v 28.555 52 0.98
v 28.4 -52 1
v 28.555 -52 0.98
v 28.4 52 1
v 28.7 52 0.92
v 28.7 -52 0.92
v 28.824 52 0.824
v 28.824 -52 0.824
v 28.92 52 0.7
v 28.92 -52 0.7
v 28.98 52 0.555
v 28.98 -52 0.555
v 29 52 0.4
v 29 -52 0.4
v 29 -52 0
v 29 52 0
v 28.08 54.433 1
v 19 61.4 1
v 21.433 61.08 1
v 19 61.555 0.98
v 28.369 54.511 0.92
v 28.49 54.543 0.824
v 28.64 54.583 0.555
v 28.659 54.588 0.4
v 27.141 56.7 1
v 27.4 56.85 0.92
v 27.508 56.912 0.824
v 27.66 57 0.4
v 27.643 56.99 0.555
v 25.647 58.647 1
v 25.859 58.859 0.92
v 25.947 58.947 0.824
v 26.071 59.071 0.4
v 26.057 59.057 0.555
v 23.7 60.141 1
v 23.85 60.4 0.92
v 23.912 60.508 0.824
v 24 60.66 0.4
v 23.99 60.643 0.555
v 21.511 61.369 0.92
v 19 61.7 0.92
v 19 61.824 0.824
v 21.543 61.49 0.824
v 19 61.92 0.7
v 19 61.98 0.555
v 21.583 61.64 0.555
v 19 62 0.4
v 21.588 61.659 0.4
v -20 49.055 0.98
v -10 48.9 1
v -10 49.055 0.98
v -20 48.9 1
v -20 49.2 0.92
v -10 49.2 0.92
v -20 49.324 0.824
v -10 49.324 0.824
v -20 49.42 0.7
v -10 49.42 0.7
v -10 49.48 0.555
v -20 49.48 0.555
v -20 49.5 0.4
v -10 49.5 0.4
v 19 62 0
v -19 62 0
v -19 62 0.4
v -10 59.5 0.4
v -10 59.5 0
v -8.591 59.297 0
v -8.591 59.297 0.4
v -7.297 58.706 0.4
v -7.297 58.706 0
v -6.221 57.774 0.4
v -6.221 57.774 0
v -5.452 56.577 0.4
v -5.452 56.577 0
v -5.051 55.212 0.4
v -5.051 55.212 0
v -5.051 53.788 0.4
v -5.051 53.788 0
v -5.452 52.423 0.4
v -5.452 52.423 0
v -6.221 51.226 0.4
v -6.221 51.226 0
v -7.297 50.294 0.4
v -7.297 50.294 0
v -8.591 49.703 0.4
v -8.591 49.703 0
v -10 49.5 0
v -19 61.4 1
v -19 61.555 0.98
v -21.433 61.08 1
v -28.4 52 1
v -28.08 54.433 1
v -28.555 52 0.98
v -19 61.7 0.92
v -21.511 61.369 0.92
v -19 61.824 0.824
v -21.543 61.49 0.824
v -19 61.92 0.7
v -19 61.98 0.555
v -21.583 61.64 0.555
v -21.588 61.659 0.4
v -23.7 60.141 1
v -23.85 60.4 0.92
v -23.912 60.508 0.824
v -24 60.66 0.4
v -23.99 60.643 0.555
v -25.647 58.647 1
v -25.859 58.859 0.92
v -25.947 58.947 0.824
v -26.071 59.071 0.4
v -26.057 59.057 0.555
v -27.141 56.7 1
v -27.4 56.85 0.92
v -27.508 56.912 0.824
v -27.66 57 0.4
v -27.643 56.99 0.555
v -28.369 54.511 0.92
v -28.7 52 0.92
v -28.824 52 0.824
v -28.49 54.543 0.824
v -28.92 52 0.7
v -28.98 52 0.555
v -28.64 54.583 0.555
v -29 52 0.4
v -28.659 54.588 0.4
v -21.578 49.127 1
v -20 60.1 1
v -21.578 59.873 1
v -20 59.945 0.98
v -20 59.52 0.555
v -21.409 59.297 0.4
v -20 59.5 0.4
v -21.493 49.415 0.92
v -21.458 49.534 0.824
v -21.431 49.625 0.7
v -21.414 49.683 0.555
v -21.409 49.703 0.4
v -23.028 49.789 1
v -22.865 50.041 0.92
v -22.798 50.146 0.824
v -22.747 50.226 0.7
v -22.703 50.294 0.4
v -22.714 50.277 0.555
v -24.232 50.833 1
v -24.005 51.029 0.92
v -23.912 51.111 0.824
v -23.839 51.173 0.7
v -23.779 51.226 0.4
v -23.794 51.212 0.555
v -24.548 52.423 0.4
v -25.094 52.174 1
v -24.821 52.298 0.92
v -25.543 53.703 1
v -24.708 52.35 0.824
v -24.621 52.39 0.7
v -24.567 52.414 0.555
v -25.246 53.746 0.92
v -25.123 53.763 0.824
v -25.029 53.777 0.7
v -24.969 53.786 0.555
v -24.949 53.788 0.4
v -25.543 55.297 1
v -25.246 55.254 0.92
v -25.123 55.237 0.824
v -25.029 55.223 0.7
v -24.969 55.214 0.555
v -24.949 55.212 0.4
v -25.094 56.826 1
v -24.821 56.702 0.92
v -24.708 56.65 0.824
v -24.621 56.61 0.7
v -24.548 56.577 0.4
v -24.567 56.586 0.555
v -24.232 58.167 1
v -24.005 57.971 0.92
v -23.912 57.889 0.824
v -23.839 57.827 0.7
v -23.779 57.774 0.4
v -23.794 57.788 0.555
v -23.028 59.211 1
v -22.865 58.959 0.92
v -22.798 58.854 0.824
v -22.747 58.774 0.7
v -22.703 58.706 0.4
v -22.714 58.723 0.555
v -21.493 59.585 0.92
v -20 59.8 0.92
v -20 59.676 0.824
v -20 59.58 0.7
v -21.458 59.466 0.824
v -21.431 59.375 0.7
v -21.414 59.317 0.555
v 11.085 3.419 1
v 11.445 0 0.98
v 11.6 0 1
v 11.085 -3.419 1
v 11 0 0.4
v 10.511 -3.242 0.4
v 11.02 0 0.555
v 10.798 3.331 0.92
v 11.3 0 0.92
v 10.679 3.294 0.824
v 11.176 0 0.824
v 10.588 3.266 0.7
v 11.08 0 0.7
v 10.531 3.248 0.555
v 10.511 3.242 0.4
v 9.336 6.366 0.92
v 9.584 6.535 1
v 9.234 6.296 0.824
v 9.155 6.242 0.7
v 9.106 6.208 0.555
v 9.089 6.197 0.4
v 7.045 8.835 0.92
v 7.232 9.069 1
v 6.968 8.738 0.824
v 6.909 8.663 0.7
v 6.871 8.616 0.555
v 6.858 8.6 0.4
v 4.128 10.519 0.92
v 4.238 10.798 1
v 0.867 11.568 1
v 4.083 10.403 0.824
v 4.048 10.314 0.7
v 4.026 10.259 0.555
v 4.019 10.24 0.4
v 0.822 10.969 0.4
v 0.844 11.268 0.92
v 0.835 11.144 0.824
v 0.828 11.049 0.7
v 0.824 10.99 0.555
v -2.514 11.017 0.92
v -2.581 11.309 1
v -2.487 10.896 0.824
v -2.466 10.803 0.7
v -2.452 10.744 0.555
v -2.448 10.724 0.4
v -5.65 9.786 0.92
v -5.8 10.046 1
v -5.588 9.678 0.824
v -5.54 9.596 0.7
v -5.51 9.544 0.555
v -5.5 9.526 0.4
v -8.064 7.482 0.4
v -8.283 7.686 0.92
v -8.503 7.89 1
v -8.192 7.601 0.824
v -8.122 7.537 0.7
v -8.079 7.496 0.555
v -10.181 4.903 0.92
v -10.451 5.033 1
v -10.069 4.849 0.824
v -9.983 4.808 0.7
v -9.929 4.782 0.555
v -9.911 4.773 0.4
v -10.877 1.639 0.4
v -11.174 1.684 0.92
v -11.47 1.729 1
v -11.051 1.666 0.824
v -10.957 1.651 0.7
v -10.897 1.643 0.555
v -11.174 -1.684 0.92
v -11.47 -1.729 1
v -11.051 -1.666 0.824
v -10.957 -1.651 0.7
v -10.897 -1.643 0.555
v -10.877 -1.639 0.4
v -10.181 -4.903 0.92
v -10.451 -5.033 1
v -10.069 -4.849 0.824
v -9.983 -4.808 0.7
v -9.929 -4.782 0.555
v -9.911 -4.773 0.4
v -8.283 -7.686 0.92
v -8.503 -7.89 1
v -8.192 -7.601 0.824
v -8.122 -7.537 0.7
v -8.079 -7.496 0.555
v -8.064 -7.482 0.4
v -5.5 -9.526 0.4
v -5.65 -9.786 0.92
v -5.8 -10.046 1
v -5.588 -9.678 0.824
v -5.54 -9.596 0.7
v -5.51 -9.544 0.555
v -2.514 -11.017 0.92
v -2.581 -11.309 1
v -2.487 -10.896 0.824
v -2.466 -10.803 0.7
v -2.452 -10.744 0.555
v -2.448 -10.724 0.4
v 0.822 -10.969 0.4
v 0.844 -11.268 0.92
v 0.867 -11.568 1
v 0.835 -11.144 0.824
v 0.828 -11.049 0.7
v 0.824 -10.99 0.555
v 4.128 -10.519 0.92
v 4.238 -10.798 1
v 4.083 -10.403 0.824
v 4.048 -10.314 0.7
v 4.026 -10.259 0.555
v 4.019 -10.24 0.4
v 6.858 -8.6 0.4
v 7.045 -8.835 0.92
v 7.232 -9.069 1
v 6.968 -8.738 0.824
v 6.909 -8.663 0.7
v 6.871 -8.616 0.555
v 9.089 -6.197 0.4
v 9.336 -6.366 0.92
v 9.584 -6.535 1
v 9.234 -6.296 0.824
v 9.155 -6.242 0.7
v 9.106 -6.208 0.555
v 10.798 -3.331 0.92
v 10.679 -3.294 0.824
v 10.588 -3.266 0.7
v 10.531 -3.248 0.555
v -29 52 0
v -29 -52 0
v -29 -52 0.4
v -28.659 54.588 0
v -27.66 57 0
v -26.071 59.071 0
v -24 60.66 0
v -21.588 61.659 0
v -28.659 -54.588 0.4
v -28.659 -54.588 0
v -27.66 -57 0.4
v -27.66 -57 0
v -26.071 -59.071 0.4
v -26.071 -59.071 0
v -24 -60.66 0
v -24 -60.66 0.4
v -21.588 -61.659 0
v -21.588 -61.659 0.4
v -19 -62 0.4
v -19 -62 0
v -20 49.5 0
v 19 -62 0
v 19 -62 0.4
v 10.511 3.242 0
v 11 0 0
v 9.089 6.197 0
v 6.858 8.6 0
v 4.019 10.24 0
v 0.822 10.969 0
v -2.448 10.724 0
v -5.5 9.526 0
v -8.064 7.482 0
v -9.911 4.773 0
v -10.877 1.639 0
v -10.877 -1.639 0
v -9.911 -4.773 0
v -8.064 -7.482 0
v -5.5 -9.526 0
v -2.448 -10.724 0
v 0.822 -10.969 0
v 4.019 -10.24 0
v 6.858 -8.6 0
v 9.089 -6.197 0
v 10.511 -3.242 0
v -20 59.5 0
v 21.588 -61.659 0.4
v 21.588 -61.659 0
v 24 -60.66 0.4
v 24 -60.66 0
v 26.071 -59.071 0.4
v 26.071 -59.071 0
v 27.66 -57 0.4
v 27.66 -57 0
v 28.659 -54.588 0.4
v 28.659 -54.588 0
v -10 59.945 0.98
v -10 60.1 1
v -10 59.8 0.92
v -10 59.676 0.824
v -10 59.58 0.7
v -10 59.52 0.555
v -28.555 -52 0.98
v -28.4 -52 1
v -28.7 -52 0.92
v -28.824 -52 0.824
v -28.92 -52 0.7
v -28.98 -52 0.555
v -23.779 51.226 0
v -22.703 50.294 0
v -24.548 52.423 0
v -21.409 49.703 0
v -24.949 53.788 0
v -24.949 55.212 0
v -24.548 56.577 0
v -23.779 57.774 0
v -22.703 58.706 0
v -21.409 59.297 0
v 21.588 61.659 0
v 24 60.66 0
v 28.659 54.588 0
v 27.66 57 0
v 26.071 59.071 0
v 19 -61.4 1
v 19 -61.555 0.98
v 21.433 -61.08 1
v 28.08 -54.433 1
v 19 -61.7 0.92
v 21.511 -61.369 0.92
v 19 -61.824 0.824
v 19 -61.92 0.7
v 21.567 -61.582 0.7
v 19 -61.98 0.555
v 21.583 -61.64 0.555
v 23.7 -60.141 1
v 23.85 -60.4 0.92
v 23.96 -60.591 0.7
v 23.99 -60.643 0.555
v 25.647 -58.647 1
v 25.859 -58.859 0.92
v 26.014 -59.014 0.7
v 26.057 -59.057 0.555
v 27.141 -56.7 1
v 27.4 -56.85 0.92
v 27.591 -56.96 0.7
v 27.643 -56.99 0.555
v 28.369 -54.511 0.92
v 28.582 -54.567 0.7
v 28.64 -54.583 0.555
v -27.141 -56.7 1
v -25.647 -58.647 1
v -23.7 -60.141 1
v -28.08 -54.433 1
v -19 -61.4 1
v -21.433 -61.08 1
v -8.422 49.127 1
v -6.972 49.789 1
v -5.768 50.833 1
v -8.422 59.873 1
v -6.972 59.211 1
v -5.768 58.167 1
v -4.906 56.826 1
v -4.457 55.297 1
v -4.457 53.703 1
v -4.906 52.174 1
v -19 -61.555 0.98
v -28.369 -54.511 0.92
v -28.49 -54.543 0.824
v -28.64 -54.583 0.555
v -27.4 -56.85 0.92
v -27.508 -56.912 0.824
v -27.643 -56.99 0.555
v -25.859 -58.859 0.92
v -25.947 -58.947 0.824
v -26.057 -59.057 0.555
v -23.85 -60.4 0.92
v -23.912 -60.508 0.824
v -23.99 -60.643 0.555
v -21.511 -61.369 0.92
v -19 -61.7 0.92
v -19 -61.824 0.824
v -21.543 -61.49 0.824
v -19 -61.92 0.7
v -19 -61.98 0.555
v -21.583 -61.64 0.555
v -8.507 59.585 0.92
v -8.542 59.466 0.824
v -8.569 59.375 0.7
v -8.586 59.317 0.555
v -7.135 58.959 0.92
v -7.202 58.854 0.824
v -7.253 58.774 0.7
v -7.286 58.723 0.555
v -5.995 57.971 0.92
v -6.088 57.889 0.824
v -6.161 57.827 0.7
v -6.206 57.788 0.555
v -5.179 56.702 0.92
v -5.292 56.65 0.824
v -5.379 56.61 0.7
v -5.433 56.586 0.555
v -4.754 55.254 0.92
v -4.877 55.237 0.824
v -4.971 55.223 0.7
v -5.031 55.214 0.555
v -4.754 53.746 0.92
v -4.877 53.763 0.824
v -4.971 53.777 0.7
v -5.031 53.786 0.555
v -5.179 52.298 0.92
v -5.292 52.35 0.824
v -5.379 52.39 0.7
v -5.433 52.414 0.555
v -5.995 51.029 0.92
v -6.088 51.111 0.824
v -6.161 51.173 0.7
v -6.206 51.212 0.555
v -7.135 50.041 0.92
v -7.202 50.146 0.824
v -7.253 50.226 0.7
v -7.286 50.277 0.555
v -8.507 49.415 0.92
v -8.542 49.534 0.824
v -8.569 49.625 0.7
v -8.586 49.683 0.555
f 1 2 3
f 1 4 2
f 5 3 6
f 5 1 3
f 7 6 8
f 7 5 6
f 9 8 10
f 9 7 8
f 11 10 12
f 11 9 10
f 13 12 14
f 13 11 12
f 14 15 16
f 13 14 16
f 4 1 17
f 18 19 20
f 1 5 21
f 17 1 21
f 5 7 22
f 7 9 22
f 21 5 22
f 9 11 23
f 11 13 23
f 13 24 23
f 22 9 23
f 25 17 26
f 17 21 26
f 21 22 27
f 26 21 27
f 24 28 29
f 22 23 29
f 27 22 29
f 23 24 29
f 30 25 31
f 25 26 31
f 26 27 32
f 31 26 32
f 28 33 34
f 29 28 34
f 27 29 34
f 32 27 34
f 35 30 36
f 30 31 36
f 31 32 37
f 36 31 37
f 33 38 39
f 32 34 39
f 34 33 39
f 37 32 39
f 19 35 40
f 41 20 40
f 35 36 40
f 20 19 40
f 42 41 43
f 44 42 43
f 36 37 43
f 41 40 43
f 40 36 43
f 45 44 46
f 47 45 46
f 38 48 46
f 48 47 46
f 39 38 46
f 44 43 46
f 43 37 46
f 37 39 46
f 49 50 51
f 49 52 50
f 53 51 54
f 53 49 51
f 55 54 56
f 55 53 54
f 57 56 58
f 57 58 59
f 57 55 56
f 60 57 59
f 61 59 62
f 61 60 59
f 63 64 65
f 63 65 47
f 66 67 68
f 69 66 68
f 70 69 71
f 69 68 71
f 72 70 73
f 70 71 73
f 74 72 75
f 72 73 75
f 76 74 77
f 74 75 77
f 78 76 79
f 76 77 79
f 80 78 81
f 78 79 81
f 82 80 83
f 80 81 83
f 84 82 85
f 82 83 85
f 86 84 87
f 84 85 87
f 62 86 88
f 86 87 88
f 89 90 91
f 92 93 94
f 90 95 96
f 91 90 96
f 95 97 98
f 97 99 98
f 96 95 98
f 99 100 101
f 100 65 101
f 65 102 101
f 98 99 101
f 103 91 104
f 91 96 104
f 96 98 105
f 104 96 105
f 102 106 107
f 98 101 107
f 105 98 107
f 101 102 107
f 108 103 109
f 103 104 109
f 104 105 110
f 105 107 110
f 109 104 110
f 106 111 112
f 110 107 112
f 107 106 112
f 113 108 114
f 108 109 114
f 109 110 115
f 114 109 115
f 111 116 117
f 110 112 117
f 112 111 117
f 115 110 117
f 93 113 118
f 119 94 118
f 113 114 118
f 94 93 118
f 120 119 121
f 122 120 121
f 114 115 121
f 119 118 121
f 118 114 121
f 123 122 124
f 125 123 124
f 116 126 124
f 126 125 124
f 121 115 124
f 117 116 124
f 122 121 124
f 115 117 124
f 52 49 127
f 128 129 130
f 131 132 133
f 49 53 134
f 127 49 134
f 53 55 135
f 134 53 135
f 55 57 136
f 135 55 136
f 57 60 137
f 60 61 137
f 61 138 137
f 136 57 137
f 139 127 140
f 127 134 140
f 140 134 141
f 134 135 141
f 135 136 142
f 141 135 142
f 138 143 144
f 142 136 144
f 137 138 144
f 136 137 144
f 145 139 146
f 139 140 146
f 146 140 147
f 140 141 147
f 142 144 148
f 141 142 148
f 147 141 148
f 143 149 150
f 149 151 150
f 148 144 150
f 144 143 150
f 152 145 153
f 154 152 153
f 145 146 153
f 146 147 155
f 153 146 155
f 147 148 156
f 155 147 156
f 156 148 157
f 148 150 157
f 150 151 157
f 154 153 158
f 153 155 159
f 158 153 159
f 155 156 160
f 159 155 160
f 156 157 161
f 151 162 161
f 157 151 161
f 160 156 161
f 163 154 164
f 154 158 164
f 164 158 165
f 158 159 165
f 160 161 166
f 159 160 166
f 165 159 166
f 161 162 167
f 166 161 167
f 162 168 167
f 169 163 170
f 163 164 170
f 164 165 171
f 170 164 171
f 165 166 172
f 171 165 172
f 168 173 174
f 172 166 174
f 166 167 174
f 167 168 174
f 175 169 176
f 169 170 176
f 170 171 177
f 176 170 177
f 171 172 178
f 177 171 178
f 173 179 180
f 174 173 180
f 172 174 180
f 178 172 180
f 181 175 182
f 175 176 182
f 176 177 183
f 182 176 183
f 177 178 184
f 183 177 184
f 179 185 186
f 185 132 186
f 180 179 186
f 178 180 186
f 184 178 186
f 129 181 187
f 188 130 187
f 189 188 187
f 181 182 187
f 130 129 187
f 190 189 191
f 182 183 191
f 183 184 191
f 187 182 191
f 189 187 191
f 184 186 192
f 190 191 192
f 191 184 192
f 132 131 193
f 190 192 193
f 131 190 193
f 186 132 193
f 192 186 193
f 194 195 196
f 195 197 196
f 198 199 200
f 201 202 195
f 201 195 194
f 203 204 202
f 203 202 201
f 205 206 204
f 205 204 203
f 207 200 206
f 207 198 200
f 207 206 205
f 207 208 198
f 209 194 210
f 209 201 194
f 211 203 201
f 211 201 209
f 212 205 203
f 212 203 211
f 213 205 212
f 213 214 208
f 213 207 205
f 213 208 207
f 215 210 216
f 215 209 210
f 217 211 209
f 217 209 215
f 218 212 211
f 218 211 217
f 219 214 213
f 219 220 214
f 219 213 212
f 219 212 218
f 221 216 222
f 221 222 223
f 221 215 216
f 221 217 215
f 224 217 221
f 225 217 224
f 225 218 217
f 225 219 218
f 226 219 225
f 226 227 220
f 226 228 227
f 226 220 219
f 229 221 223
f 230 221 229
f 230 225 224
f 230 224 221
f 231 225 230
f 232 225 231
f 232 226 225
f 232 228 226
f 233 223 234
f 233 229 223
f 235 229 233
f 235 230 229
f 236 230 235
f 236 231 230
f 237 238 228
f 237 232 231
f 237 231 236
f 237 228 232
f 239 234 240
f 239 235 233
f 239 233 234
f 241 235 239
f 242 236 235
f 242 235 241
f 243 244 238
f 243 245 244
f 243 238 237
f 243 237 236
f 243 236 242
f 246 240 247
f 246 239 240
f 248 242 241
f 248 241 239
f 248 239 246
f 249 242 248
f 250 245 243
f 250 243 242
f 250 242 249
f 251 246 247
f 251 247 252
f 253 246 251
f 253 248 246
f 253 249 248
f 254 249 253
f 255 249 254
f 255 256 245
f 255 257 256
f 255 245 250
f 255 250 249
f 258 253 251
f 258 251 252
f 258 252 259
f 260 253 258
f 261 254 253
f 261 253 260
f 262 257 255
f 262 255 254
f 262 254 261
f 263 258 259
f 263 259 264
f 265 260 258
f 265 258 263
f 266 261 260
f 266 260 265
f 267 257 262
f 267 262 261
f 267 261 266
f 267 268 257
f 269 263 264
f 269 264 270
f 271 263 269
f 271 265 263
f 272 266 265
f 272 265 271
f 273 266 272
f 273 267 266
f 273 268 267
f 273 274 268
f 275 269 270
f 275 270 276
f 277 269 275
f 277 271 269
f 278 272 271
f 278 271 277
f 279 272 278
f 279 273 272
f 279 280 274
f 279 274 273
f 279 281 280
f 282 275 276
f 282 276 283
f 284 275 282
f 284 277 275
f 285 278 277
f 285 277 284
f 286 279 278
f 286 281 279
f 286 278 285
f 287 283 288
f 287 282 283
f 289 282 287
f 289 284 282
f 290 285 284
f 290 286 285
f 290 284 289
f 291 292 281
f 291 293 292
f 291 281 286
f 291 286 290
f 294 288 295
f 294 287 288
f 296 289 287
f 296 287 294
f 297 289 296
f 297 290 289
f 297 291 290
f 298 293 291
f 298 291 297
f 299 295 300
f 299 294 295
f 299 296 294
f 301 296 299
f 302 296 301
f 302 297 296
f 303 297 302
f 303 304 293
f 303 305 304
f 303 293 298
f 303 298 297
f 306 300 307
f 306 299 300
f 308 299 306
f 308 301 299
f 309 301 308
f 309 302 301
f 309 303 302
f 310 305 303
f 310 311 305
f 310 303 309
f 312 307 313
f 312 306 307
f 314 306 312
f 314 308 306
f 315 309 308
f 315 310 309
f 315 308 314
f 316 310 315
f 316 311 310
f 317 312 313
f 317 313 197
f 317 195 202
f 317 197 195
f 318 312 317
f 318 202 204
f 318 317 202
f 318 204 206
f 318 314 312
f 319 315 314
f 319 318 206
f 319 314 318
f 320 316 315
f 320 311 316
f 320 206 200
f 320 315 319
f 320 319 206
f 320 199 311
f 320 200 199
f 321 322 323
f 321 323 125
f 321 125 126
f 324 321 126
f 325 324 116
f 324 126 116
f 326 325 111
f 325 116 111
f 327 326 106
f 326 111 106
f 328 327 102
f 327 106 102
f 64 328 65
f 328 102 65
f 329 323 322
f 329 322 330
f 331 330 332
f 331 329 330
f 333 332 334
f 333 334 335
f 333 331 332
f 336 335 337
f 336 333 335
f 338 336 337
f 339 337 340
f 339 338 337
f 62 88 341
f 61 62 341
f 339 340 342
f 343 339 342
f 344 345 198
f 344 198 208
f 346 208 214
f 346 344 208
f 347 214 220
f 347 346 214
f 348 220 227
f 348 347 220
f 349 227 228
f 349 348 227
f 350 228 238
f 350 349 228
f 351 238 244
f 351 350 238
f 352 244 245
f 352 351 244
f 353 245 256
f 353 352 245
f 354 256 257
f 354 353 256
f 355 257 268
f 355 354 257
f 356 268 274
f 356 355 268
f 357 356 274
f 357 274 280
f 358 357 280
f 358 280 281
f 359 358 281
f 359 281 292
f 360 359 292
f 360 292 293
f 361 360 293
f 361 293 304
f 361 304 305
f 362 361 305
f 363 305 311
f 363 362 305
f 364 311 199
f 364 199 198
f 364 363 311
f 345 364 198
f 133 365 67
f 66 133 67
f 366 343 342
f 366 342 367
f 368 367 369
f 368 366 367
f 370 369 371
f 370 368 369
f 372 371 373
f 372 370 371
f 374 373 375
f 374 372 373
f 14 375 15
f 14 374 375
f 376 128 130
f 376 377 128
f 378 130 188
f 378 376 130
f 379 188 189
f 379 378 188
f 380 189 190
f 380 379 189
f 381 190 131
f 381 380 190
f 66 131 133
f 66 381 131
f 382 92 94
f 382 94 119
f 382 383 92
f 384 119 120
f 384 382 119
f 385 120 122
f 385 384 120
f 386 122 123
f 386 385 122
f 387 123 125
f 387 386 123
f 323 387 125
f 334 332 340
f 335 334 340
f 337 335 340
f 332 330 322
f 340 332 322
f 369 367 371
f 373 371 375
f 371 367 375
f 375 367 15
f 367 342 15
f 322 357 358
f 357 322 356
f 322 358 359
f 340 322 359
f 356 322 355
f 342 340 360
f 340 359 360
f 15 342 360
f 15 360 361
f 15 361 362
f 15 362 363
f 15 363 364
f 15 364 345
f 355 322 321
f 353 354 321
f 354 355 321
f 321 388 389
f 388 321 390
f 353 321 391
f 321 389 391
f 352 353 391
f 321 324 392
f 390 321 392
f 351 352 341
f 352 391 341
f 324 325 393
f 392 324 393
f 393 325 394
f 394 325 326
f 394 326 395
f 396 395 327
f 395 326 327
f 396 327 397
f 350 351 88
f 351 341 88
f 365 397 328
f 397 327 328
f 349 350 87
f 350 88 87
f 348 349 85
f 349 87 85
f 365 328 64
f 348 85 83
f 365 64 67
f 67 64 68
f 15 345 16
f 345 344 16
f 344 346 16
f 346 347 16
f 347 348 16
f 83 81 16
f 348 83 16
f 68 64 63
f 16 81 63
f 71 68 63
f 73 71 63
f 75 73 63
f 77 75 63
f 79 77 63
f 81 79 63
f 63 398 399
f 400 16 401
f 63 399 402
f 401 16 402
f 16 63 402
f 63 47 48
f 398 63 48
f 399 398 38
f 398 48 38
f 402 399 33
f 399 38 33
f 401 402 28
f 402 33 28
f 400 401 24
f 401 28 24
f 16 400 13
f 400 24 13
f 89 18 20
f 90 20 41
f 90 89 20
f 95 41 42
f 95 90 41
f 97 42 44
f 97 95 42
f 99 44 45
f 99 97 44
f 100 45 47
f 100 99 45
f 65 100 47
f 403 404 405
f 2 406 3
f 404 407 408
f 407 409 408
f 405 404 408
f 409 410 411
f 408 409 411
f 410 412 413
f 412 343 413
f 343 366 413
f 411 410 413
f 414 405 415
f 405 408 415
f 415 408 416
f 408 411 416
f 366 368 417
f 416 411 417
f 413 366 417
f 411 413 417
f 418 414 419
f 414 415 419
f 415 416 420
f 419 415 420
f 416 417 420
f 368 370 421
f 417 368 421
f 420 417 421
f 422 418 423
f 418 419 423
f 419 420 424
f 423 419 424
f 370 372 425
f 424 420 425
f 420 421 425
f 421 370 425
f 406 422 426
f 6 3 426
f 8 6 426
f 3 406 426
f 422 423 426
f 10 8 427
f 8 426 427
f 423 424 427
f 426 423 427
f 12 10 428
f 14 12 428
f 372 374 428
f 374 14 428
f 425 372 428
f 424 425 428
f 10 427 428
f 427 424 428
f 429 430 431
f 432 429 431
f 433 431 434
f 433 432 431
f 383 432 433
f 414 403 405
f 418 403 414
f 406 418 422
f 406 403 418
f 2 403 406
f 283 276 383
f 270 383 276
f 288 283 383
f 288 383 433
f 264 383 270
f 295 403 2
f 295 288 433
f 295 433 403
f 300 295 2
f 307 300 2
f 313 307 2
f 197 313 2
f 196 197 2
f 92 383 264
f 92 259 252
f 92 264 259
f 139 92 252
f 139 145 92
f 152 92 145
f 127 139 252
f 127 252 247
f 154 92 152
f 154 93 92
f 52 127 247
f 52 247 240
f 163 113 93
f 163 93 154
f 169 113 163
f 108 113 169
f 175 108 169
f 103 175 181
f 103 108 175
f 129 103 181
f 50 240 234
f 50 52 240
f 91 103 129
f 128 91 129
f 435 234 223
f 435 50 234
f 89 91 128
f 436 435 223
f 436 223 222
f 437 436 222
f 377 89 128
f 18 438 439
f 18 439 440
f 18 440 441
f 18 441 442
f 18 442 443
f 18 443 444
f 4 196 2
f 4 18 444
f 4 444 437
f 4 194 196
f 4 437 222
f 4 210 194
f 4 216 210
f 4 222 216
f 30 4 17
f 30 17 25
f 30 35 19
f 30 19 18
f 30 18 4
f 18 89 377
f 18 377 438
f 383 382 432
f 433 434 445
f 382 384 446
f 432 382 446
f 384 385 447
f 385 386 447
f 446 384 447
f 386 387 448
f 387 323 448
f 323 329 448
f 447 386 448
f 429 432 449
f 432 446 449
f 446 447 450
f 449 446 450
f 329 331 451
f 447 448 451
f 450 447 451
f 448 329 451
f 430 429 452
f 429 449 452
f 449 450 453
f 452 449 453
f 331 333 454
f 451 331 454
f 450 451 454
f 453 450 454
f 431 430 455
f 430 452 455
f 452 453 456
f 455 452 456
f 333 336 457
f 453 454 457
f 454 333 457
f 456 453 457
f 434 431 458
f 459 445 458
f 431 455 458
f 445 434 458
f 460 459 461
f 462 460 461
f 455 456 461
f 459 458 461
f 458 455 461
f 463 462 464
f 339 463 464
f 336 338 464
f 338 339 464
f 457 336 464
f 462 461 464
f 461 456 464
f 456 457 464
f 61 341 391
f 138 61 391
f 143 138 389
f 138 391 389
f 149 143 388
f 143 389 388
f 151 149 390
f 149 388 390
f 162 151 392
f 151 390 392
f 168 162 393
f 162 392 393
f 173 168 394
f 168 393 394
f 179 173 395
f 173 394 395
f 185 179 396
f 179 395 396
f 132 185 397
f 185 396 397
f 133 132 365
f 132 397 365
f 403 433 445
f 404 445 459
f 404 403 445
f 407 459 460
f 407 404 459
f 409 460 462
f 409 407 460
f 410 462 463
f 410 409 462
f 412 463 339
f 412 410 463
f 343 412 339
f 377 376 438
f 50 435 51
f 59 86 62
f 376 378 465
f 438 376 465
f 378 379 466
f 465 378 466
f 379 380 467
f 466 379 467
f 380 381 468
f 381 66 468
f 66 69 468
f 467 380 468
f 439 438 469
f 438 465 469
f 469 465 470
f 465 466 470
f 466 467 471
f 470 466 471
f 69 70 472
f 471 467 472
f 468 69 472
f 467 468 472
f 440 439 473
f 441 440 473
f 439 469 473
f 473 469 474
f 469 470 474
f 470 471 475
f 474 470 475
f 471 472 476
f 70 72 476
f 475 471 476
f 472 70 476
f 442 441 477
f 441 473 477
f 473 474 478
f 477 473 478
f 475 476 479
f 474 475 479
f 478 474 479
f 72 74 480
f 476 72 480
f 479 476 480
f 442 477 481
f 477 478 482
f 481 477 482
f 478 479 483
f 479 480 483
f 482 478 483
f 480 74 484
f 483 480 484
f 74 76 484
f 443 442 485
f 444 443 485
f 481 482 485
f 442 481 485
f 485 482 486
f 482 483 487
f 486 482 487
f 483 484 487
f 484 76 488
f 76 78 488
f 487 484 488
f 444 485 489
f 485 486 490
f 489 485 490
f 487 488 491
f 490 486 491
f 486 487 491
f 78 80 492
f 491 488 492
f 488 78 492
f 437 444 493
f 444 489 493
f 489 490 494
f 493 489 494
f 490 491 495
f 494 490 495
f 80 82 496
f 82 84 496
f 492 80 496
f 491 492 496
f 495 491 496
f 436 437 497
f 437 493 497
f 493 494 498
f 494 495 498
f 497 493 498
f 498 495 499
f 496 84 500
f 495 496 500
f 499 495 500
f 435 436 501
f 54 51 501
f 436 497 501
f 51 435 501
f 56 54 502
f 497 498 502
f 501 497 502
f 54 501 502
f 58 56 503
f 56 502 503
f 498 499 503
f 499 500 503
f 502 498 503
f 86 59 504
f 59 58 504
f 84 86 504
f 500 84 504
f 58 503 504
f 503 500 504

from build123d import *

# Parameters (mm, degrees)
F0_W     = 58
F0_H     = 124
F0_R     = 11
F1_DEPTH = 1
F2_R     = 10
F3_R     = 0.6


with BuildPart() as f1:
    # F0 (on Top) → F1 (new body)
    with BuildSketch(Plane.XY):
        Rectangle(F0_W, F0_H)
        with BuildLine():
            ThreePointArc((-20, 49.5), (-25, 54.5), (-20, 59.5))
            Line((-20, 59.5), (-10, 59.5))
            ThreePointArc((-10, 59.5), (-5, 54.5), (-10, 49.5))
            Line((-10, 49.5), (-20, 49.5))
        make_face(mode=Mode.SUBTRACT)
        Circle(F0_R, mode=Mode.SUBTRACT)
    extrude(amount=F1_DEPTH)

    # F2
    f2_edges = [f1.edges().sort_by_distance(p)[0] for p in [
        (-29, -62, 0.5),
        (29, -62, 0.5),
        (29, 62, 0.5),
        (-29, 62, 0.5),
    ]]
    fillet(f2_edges, radius=F2_R)

    # F3
    f3_edges = [f1.edges().sort_by_distance(p)[0] for p in [
        (29, 0, 1),
        (26.071068, -59.071068, 1),
        (26.071068, 59.071068, 1),
        (0, -62, 1),
        (0, 62, 1),
        (-26.071068, -59.071068, 1),
        (-26.071068, 59.071068, 1),
        (-29, 0, 1),
        (-25, 54.5, 1),
        (-15, 59.5, 1),
        (-5, 54.5, 1),
        (-15, 49.5, 1),
        (-11, 0, 1),
    ]]
    fillet(f3_edges, radius=F3_R)


solid = f1.part
